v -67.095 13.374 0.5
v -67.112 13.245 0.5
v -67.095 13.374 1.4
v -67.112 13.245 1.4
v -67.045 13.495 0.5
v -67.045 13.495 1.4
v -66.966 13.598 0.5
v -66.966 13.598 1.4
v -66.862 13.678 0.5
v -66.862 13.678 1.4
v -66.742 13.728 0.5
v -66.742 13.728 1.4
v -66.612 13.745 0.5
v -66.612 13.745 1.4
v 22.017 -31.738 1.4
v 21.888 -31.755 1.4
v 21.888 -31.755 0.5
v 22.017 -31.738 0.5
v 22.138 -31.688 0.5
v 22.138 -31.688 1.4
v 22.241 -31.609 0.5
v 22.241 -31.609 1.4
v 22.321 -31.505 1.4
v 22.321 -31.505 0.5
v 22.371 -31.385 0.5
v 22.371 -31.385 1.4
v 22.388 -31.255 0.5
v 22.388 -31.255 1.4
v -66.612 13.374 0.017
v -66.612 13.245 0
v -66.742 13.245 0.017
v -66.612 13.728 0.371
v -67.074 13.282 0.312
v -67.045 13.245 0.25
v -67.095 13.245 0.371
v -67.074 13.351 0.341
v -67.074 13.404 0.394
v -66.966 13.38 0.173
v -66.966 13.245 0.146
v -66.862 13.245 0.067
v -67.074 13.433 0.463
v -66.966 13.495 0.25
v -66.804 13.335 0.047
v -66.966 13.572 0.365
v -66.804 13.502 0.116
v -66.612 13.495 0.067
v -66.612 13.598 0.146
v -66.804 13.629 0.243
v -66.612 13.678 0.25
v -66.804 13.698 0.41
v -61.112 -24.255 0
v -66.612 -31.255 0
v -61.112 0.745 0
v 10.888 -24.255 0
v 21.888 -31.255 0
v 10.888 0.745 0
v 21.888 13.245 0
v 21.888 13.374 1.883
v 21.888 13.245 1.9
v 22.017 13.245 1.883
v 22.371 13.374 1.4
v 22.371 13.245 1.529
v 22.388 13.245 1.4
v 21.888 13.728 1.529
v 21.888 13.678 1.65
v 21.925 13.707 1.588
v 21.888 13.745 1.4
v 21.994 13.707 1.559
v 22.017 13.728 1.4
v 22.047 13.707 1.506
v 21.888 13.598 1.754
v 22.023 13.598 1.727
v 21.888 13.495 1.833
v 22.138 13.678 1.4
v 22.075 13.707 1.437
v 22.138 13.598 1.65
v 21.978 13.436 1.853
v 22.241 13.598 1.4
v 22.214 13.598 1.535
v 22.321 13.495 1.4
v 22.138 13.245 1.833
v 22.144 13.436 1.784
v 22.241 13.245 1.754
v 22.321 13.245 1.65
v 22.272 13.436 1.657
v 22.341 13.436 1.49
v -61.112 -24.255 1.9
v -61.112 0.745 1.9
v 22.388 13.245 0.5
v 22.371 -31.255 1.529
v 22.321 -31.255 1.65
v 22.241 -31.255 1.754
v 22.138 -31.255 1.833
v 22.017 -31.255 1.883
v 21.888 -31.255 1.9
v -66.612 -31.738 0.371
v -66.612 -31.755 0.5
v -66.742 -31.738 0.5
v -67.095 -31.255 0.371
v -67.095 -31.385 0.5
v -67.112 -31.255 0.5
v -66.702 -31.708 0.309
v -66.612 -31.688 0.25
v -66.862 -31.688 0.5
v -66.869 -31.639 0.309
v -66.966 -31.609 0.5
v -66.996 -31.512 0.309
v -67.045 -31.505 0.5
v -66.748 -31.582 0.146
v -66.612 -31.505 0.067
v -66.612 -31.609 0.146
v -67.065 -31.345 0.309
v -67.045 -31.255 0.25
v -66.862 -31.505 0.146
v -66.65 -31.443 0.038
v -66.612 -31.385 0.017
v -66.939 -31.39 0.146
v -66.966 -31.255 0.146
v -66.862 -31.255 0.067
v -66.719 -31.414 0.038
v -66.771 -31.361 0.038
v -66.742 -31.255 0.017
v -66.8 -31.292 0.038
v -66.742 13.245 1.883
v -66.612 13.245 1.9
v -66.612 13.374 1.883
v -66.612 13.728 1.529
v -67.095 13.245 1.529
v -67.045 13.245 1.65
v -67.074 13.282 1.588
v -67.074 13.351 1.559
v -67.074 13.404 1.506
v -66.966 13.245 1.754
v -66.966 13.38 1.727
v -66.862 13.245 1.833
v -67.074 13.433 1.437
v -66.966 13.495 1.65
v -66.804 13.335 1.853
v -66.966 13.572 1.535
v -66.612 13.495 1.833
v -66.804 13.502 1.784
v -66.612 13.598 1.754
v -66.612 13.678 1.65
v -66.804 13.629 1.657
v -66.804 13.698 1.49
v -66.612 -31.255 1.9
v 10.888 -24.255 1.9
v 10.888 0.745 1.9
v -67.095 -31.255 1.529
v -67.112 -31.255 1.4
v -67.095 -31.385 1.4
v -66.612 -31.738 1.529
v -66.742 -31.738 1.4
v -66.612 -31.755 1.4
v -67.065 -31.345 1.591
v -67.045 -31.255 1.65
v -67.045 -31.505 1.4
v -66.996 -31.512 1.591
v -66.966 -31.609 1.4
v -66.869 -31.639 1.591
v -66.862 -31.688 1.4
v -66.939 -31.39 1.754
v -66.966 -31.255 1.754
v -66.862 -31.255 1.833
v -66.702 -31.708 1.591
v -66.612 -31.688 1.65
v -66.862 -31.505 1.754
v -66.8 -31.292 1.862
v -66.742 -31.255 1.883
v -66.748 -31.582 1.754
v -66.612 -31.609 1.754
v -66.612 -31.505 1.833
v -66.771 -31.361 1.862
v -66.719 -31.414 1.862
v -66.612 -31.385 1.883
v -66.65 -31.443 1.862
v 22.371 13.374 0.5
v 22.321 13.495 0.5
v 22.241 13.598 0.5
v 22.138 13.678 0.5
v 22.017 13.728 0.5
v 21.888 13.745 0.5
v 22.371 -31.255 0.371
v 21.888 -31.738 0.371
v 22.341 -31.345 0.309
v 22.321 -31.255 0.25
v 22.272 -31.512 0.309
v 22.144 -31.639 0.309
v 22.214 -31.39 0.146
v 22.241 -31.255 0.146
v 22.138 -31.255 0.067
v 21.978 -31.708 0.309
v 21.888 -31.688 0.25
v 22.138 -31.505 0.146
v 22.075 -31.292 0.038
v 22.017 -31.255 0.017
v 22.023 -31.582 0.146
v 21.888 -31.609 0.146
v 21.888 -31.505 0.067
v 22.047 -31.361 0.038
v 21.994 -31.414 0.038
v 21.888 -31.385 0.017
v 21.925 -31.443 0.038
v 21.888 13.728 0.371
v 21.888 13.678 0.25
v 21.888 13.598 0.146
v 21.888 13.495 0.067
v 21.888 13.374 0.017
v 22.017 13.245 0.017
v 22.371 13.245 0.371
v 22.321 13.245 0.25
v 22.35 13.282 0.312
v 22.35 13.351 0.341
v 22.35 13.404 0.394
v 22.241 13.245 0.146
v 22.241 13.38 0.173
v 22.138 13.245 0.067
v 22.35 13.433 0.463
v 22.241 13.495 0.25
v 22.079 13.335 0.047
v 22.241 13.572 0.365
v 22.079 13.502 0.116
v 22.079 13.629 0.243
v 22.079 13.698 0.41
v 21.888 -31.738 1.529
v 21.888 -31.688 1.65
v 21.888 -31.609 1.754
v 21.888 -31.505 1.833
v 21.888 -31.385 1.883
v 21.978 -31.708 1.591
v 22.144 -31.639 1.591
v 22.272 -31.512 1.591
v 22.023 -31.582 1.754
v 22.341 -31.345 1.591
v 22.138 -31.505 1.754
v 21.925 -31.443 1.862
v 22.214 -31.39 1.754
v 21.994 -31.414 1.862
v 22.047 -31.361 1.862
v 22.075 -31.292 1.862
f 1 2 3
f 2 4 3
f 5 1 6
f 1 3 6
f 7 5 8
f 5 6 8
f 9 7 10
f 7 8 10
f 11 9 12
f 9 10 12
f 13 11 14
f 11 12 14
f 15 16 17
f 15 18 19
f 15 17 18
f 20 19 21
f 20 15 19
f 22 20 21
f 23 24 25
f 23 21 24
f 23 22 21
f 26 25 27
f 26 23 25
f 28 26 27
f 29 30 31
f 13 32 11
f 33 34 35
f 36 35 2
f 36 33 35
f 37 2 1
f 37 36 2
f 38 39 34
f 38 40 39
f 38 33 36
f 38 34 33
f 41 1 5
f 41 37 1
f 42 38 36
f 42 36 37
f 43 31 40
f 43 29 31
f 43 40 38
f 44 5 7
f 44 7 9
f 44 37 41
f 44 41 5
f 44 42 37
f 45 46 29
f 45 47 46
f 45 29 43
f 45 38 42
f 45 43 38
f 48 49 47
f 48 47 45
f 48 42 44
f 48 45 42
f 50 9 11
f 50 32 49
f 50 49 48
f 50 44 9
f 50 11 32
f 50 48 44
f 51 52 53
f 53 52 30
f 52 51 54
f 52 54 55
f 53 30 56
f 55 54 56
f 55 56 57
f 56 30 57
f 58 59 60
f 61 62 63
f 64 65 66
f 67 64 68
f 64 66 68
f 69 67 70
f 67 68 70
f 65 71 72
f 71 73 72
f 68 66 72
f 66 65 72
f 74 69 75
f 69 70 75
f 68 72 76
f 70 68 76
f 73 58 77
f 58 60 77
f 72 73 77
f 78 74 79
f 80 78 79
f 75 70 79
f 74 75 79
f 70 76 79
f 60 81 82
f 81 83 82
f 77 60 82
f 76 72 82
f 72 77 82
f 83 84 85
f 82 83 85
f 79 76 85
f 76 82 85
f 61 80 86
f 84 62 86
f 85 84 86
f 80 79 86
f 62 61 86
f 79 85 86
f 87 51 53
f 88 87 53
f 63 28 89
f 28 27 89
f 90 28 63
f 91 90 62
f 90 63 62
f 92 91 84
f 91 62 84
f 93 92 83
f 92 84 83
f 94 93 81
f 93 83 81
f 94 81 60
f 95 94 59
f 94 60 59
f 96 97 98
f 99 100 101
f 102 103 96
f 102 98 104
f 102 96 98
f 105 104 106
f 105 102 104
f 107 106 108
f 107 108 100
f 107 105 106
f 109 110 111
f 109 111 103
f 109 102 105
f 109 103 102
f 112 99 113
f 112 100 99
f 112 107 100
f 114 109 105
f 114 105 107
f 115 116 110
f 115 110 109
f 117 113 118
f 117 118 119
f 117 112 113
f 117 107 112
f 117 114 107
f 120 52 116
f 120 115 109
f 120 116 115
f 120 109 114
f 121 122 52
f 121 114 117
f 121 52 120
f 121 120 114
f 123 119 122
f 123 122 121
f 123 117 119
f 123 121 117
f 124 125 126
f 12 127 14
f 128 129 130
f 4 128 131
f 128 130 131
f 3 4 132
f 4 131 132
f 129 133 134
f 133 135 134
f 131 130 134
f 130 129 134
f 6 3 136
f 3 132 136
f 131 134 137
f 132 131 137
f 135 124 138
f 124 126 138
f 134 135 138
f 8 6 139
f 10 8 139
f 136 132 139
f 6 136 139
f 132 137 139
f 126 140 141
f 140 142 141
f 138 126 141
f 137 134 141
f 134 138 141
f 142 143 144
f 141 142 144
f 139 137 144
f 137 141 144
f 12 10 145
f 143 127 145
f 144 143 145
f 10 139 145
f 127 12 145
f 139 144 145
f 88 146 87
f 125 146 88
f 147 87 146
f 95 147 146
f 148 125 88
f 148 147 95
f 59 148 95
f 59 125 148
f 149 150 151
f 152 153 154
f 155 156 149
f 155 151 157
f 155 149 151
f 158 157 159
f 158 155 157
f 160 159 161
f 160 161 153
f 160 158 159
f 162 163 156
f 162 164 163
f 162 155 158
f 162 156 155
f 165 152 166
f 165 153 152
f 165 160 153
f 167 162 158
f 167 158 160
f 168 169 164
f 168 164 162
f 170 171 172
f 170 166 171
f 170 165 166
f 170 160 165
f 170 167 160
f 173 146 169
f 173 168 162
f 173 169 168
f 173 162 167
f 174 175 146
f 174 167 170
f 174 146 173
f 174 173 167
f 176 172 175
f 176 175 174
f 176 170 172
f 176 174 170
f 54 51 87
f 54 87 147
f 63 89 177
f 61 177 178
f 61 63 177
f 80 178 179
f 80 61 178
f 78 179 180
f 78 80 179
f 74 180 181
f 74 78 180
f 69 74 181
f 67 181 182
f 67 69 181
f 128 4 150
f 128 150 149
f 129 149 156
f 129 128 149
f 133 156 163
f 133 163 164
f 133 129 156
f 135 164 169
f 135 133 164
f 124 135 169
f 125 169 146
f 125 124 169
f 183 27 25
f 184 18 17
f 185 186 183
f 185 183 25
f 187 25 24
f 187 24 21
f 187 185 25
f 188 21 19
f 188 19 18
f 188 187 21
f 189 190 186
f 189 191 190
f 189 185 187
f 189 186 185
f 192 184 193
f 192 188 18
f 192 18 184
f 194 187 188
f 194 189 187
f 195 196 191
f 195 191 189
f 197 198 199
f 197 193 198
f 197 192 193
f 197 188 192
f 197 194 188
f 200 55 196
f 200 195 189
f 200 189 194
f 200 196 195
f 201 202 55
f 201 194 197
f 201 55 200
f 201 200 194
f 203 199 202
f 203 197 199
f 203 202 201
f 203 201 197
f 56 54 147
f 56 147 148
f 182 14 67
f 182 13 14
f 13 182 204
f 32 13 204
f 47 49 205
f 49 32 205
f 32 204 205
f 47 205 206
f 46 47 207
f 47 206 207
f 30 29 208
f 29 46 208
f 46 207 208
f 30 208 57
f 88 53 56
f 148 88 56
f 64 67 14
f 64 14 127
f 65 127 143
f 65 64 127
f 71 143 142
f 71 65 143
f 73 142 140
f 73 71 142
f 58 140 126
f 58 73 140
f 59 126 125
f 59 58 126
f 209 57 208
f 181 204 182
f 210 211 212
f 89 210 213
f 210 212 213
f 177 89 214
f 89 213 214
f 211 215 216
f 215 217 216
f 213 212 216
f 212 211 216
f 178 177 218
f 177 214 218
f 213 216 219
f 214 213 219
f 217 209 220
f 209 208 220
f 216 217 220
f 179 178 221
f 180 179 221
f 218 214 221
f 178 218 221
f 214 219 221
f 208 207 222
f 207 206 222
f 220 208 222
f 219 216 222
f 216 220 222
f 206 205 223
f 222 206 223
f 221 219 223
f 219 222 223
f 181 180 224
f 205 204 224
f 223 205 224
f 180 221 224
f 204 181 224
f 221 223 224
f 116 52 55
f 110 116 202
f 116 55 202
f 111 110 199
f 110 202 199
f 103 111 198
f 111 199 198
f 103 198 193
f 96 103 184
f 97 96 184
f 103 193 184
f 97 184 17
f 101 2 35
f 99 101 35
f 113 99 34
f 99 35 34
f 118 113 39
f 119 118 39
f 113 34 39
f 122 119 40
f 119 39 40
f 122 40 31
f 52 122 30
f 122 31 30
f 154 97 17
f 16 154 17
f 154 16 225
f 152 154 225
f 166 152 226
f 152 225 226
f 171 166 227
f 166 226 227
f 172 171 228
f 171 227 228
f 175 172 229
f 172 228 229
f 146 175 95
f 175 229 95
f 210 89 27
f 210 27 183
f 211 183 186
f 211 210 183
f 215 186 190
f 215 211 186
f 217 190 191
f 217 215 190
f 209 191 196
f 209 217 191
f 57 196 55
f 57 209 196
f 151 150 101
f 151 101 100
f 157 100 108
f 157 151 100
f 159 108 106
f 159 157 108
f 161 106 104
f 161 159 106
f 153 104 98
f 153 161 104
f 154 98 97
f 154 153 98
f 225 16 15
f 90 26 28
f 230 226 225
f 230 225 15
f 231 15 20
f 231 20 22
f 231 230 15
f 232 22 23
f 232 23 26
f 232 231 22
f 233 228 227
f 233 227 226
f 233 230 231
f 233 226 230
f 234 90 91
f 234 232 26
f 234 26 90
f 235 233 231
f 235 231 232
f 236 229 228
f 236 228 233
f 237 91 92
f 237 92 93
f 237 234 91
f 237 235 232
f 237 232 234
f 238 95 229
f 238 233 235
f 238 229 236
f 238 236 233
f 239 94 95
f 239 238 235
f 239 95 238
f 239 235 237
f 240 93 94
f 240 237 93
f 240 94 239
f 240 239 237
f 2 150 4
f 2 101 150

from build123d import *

# Parameters (mm, degrees)
SKETCH1_W               = 89.5
SKETCH1_H               = 45.5
BOSS_EXTRUDE1_DEPTH     = 1.9
FILLET1_R               = 0.5
FILLET2_R               = 0.5
CUT_EXTRUDE1_DEPTH      = 75.270166564
CUT_EXTRUDE1_DEPTH_BACK = 75.270166564
SKETCH2_W               = 72
SKETCH2_H               = 25


with BuildPart() as part:
    # Sketch1 → Boss-Extrude1 (new body)
    with BuildSketch(Plane.XY):
        with Locations((-22.362297468, -9.005112503)):
            Rectangle(SKETCH1_W, SKETCH1_H)
    extrude(amount=BOSS_EXTRUDE1_DEPTH)

    # Fillet1
    fillet1_edges = [part.edges().sort_by_distance(p)[0] for p in [
        (22.387702532, -9.005112503, 1.9),
        (-22.362297468, 13.744887497, 1.9),
        (-67.112297468, -9.005112503, 1.9),
        (-22.362297468, 13.744887497, 0),
        (22.387702532, -9.005112503, 0),
        (-67.112297468, -9.005112503, 0),
        (-67.112297468, 13.744887497, 0.95),
        (22.387702532, 13.744887497, 0.95),
        (22.387702532, -31.755112503, 0.95),
        (-67.112297468, -31.755112503, 0.95),
    ]]
    fillet(fillet1_edges, radius=FILLET1_R)

    # Fillet2
    # the kernel refuses this fillet: 0.5 mm, written as the material it takes off along each edge
    with BuildSketch(Plane(origin=(-66.612297468, -31.255112503, 1.4), x_dir=(0, -1, 0), z_dir=(0, 0, 1))) as fillet2_piece_1_section:
        Polygon((0, 0), (FILLET2_R, 0), (FILLET2_R, -FILLET2_R), (0, -FILLET2_R), align=None)
    fillet2_piece_1 = extrude(amount=FILLET2_R, mode=Mode.PRIVATE)
    fillet2_piece_1 = fillet2_piece_1 - Plane(origin=(-66.612297468, -31.255112503, 1.4), x_dir=(0.7071067811865475, 0.7071067811865477, 0), z_dir=(0, 0, 1)) * Sphere(FILLET2_R, mode=Mode.PRIVATE)
    add(fillet2_piece_1, mode=Mode.SUBTRACT)
    with BuildSketch(Plane(origin=(-66.612297468, -31.255112503, 0.5), x_dir=(0, -1, 0), z_dir=(0, 0, -1))) as fillet2_piece_2_section:
        Polygon((0, 0), (FILLET2_R, 0), (FILLET2_R, FILLET2_R), (0, FILLET2_R), align=None)
    fillet2_piece_2 = extrude(amount=FILLET2_R, mode=Mode.PRIVATE)
    fillet2_piece_2 = fillet2_piece_2 - Plane(origin=(-66.612297468, -31.255112503, 0.5), x_dir=(0.7071067811865475, 0.7071067811865477, 0), z_dir=(0, 0, -1)) * Sphere(FILLET2_R, mode=Mode.PRIVATE)
    add(fillet2_piece_2, mode=Mode.SUBTRACT)
    with BuildSketch(Plane(origin=(21.887702532, -31.255112503, 1.4), x_dir=(0, -1, 0), z_dir=(0, 0, 1))) as fillet2_piece_3_section:
        Polygon((0, 0), (FILLET2_R, 0), (FILLET2_R, FILLET2_R), (0, FILLET2_R), align=None)
    fillet2_piece_3 = extrude(amount=FILLET2_R, mode=Mode.PRIVATE)
    fillet2_piece_3 = fillet2_piece_3 - Plane(origin=(21.887702532, -31.255112503, 1.4), x_dir=(-0.7071067811865476, 0.7071067811865474, 0), z_dir=(0, 0, 1)) * Sphere(FILLET2_R, mode=Mode.PRIVATE)
    add(fillet2_piece_3, mode=Mode.SUBTRACT)
    with BuildSketch(Plane(origin=(21.887702532, -31.255112503, 0.5), x_dir=(0, -1, 0), z_dir=(0, 0, -1))) as fillet2_piece_4_section:
        Polygon((0, 0), (FILLET2_R, 0), (FILLET2_R, -FILLET2_R), (0, -FILLET2_R), align=None)
    fillet2_piece_4 = extrude(amount=FILLET2_R, mode=Mode.PRIVATE)
    fillet2_piece_4 = fillet2_piece_4 - Plane(origin=(21.887702532, -31.255112503, 0.5), x_dir=(-0.7071067811865476, 0.7071067811865474, 0), z_dir=(0, 0, -1)) * Sphere(FILLET2_R, mode=Mode.PRIVATE)
    add(fillet2_piece_4, mode=Mode.SUBTRACT)
    with BuildSketch(Plane(origin=(21.887702532, -31.755112503, 0), x_dir=(0, 1, 0), z_dir=(-1, 0, 0))) as fillet2_piece_5:
        with BuildLine():
            CenterArc((FILLET2_R, -FILLET2_R), FILLET2_R, 90, 90)
            Line((0, -FILLET2_R), (0, 0))
            Line((0, 0), (FILLET2_R, 0))
        make_face()
    extrude(amount=88.5, mode=Mode.SUBTRACT)
    with BuildSketch(Plane(origin=(21.887702532, -31.755112503, 1.9), x_dir=(0, 1, 0), z_dir=(-1, 0, 0))) as fillet2_piece_6:
        with BuildLine():
            CenterArc((FILLET2_R, FILLET2_R), FILLET2_R, 180, 90)
            Line((0, FILLET2_R), (0, 0))
            Line((0, 0), (FILLET2_R, 0))
        make_face()
    extrude(amount=88.5, mode=Mode.SUBTRACT)

    # Sketch2 → Cut-Extrude1 (cut, two sides: drawn at the far end of the back side and taken through both)
    with BuildSketch(Plane.XY.offset(1.9).offset(-CUT_EXTRUDE1_DEPTH_BACK)):
        with Locations((-25.112297468, -11.755112503)):
            Rectangle(SKETCH2_W, SKETCH2_H)
    extrude(amount=CUT_EXTRUDE1_DEPTH + CUT_EXTRUDE1_DEPTH_BACK, mode=Mode.SUBTRACT)


solid = part.part
